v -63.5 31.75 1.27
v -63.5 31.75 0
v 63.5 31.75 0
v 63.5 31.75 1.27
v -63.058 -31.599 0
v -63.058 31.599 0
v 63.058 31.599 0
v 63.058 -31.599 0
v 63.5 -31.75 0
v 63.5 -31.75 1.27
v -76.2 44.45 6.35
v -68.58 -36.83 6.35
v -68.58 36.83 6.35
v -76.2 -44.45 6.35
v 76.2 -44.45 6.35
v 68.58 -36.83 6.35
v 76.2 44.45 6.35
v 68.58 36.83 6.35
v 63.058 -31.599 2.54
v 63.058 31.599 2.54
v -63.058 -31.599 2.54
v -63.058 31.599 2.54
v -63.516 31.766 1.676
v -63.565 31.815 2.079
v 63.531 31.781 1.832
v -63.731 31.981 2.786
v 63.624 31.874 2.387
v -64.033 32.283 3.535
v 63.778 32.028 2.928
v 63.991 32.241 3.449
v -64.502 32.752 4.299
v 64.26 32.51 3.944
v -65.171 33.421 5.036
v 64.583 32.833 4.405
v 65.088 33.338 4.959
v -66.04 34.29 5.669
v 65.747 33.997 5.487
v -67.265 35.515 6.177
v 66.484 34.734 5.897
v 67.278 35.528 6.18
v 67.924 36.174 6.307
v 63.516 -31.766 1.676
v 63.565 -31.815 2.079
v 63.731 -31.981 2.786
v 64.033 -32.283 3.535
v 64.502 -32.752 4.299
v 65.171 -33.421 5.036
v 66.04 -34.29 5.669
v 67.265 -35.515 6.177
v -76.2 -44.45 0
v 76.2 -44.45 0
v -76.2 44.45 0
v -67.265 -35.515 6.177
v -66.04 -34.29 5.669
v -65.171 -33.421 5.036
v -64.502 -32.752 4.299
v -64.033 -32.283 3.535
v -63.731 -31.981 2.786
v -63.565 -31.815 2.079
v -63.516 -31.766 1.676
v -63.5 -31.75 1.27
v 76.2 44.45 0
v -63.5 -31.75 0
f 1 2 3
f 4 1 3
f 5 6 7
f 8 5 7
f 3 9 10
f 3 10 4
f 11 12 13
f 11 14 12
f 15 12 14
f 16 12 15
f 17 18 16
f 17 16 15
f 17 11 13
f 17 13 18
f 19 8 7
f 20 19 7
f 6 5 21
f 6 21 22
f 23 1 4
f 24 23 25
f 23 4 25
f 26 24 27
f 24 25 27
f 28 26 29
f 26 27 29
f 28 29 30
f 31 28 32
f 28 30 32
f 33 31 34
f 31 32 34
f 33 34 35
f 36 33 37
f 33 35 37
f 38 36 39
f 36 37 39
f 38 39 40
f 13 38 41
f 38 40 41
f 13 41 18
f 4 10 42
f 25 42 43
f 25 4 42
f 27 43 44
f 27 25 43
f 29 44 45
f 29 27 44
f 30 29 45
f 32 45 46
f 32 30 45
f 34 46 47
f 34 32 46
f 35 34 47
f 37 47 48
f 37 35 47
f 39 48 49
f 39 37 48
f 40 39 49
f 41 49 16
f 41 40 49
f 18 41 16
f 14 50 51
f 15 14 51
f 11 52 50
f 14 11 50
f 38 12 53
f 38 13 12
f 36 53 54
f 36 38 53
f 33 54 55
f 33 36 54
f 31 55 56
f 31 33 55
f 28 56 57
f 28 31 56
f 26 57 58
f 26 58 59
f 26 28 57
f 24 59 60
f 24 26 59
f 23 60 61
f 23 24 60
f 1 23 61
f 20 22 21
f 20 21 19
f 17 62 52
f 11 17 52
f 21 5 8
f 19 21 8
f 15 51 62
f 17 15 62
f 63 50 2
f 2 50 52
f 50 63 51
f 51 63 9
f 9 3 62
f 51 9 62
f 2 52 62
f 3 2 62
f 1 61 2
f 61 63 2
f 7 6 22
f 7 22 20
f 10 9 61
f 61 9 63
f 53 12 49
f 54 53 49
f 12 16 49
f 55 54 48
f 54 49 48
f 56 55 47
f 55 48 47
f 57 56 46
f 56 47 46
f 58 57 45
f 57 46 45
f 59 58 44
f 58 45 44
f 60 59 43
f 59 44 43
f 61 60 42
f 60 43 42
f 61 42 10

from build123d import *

# Parameters (mm, degrees)
F0_W     = 12.7
F0_H     = 12.7
F0_H_2   = 63.5
F0_W_2   = 127
F1_DEPTH = 6.35
F2_W     = 126.1163949966
F2_H     = 63.1982386112
F3_DEPTH = 2.54
F4_R     = 5.08
F5_R     = 5.08
F6_R     = 5.08
F7_R     = 5.08


with BuildPart() as f1:
    # F0 (on Top) → F1 (new body)
    with BuildSketch(Plane.XY):
        with Locations((-69.85, -38.1)):
            Rectangle(F0_W, F0_H)
        Polygon((-63.5, -31.75), (-63.5, -44.45), (76.2, -44.45), (76.2, -31.75), (63.5, -31.75), align=None)
        with Locations((-69.85, 0)):
            Rectangle(F0_W, F0_H_2)
        with Locations((69.85, 0)):
            Rectangle(F0_W, F0_H_2)
        with Locations((-69.85, 38.1)):
            Rectangle(F0_W, F0_H)
        with Locations((0, 38.1)):
            Rectangle(F0_W_2, F0_H)
        with Locations((69.85, 38.1)):
            Rectangle(F0_W, F0_H)
    extrude(amount=F1_DEPTH)

    # F4
    f4_edges = [f1.edges().sort_by_distance(p)[0] for p in [
        (0, 31.75, 6.35),
    ]]
    fillet(f4_edges, radius=F4_R)

    # F5
    f5_edges = [f1.edges().sort_by_distance(p)[0] for p in [
        (63.5, 0, 6.35),
    ]]
    fillet(f5_edges, radius=F5_R)

    # F6
    f6_edges = [f1.edges().sort_by_distance(p)[0] for p in [
        (0, -31.75, 6.35),
    ]]
    fillet(f6_edges, radius=F6_R)

    # F7
    f7_edges = [f1.edges().sort_by_distance(p)[0] for p in [
        (-63.5, 0, 6.35),
    ]]
    fillet(f7_edges, radius=F7_R)


with BuildPart() as f3:
    # F2 (on Top) → F3 (new body)
    with BuildSketch(Plane.XY):
        Rectangle(F2_W, F2_H)
    extrude(amount=F3_DEPTH)


solid = Compound([f1.part, f3.part])
